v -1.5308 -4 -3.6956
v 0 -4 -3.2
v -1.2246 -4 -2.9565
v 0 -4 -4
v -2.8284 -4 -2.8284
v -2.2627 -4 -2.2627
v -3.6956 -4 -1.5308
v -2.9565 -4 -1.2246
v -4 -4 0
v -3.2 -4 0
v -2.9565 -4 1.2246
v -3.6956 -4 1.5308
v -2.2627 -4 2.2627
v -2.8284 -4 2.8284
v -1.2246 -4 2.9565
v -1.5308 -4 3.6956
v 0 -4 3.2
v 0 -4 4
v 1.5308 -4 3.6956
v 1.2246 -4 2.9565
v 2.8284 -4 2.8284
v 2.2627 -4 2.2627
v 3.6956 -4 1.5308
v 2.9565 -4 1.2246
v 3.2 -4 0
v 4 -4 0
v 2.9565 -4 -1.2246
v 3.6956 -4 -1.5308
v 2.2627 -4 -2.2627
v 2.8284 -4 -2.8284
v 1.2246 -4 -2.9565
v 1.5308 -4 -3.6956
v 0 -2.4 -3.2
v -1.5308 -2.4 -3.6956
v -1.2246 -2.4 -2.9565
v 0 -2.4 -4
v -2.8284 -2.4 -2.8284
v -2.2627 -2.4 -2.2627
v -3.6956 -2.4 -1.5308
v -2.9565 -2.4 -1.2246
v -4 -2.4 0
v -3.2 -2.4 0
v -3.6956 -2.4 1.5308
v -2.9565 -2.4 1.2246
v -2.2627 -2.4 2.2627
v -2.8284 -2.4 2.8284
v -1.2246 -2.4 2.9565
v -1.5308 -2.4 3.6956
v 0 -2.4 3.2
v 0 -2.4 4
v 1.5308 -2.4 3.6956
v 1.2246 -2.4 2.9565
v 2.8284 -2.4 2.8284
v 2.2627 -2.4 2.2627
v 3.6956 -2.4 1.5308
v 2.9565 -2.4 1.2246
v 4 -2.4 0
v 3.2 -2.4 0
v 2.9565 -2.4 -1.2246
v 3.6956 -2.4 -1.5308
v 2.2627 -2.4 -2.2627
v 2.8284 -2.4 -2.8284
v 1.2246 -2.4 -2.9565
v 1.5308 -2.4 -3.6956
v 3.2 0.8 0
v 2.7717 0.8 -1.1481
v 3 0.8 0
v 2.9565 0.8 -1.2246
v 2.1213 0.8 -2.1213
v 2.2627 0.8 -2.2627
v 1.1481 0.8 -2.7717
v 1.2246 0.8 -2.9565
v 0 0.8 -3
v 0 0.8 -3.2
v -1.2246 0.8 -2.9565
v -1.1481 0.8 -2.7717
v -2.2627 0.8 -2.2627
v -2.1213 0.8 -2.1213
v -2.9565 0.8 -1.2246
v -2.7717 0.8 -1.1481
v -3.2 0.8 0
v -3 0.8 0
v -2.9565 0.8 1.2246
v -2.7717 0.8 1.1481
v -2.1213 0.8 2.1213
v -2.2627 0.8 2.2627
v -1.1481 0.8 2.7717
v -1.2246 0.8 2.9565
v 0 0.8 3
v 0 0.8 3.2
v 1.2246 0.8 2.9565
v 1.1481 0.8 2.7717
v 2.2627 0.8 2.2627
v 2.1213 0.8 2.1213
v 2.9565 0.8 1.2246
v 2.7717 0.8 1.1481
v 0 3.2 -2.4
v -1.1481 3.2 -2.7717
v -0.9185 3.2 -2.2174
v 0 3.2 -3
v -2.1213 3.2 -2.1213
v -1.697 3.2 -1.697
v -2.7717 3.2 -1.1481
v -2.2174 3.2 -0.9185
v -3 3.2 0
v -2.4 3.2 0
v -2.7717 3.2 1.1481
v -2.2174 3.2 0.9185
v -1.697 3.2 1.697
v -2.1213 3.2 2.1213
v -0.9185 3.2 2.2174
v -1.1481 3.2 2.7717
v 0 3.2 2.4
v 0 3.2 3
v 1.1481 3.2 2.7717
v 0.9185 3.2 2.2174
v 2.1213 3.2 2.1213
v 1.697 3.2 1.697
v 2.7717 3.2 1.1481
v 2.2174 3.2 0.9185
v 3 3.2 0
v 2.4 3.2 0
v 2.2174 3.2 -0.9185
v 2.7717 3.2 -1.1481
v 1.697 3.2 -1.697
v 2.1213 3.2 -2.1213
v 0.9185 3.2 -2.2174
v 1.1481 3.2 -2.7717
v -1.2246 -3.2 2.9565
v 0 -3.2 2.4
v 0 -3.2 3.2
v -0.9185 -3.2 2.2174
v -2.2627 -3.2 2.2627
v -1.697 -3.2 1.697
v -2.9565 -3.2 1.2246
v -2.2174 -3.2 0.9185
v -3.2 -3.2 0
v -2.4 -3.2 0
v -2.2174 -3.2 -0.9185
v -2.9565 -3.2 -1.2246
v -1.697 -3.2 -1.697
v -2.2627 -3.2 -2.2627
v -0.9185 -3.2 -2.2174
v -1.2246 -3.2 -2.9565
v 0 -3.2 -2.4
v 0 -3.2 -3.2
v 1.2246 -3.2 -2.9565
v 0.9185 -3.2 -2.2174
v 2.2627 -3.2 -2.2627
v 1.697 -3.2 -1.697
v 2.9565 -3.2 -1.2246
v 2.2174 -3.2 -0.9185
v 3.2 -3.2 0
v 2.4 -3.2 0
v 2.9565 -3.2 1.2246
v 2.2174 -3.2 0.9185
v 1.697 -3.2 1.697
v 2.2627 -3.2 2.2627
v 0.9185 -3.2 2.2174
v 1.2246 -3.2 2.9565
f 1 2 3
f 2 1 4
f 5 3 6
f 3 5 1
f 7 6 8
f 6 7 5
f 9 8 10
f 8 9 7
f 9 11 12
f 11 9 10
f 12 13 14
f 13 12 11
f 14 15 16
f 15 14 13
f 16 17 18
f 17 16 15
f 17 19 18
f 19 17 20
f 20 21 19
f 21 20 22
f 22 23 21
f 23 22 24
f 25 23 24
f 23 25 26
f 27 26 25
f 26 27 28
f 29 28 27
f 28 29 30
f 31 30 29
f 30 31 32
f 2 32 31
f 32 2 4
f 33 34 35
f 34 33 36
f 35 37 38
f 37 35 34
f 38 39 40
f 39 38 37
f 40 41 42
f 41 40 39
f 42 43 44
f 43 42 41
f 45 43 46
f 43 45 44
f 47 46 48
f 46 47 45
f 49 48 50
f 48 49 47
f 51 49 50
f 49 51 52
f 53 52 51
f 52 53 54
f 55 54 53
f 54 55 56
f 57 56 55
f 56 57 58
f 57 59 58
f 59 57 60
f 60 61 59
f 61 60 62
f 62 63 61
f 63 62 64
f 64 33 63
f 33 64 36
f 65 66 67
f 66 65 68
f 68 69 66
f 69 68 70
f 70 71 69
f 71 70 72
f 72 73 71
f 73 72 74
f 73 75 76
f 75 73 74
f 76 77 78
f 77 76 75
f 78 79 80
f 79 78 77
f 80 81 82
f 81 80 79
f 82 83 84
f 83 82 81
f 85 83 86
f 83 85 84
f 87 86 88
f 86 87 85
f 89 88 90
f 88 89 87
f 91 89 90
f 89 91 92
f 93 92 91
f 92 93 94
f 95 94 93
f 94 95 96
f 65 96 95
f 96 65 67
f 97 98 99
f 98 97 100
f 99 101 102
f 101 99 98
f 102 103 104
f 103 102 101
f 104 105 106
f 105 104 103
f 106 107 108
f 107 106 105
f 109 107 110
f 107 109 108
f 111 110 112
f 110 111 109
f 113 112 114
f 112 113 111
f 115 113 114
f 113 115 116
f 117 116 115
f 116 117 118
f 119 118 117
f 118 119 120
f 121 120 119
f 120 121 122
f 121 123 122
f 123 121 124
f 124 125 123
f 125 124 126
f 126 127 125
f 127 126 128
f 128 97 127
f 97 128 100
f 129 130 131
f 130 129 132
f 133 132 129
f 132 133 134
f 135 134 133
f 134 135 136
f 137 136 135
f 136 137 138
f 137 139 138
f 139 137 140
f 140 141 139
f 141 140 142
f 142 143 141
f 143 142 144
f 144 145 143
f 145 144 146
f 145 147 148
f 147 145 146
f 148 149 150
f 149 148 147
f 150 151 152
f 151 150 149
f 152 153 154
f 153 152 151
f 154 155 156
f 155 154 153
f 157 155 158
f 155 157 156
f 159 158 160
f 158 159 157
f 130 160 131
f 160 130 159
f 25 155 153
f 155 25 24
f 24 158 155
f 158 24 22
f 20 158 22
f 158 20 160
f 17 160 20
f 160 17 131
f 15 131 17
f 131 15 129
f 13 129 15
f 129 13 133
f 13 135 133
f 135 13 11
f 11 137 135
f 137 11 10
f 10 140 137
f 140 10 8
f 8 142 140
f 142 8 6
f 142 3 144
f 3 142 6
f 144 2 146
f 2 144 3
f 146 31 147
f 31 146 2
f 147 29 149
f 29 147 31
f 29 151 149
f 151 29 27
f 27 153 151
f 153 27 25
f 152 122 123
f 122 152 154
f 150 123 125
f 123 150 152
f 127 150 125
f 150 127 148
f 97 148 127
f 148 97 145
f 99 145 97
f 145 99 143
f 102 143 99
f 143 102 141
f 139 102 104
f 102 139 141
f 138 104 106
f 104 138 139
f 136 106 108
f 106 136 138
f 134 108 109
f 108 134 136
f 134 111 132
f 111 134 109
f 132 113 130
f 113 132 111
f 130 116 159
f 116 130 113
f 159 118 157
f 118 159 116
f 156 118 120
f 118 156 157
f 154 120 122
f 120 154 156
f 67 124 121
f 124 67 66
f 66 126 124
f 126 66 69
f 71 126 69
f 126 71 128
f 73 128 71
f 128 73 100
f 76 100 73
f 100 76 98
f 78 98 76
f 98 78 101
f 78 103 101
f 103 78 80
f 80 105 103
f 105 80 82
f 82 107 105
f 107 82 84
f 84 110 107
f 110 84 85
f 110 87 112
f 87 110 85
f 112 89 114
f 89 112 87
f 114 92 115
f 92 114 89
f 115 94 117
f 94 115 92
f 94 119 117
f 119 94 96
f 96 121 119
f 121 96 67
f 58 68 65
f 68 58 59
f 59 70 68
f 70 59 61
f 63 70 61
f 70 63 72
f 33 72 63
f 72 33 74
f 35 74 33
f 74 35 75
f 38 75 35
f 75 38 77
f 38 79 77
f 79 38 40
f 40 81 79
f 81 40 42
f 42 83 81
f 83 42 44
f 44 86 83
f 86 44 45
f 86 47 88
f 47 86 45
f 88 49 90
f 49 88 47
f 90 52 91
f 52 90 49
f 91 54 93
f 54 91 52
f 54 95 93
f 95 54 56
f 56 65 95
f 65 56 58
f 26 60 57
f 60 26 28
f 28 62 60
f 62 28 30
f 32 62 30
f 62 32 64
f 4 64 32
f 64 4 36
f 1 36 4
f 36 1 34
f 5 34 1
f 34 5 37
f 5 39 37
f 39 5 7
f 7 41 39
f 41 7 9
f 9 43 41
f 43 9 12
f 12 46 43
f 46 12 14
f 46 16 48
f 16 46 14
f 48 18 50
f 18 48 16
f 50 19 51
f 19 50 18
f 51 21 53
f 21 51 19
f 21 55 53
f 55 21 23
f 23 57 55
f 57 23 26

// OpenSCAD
// file: ../p/4-4ring3.scad
use <../lib.scad>
function ldraw_lib__4_4ring3() = [
// 0 Ring  3 x 1.0
// 0 Name: 4-4ring3.dat
// 0 Author: James Jessiman
// 0 !LDRAW_ORG Primitive UPDATE 2009-01
// 0 !LICENSE Licensed under CC BY 4.0 : see CAreadme.txt
// 
// 0 BFC CERTIFY CCW
  [0,"BFC","CERTIFY"],
  [0,"BFC","CCW"],
// 
// 0 !HISTORY 1998-12-15 [PTadmin] Official Update 1998-10
// 0 !HISTORY 2002-04-05 [hafhead] Added BFC statement
// 0 !HISTORY 2002-04-25 [PTadmin] Official Update 2002-02
// 0 !HISTORY 2007-06-24 [PTadmin] Header formatted for Contributor Agreement
// 0 !HISTORY 2008-07-01 [PTadmin] Official Update 2008-01
// 0 !HISTORY 2008-08-26 [cwdee] Switch polygon winding and rename
// 0 !HISTORY 2009-05-02 [PTadmin] Official Update 2009-01
// 
// 
// 4 16 -1.5308 0 3.6956 -1.1481 0 2.7717 0 0 3 0 0 4
  [4,16,-1.5308,0,3.6956,-1.1481,0,2.7717,0,0,3,0,0,4],
// 4 16 -2.8284 0 2.8284 -2.1213 0 2.1213 -1.1481 0 2.7717 -1.5308 0 3.6956
  [4,16,-2.8284,0,2.8284,-2.1213,0,2.1213,-1.1481,0,2.7717,-1.5308,0,3.6956],
// 4 16 -3.6956 0 1.5308 -2.7717 0 1.1481 -2.1213 0 2.1213 -2.8284 0 2.8284
  [4,16,-3.6956,0,1.5308,-2.7717,0,1.1481,-2.1213,0,2.1213,-2.8284,0,2.8284],
// 4 16 -4 0 0 -3 0 0 -2.7717 0 1.1481 -3.6956 0 1.5308
  [4,16,-4,0,0,-3,0,0,-2.7717,0,1.1481,-3.6956,0,1.5308],
// 4 16 -3.6956 0 -1.5308 -2.7717 0 -1.1481 -3 0 0 -4 0 0
  [4,16,-3.6956,0,-1.5308,-2.7717,0,-1.1481,-3,0,0,-4,0,0],
// 4 16 -2.8284 0 -2.8284 -2.1213 0 -2.1213 -2.7717 0 -1.1481 -3.6956 0 -1.5308
  [4,16,-2.8284,0,-2.8284,-2.1213,0,-2.1213,-2.7717,0,-1.1481,-3.6956,0,-1.5308],
// 4 16 -1.5308 0 -3.6956 -1.1481 0 -2.7717 -2.1213 0 -2.1213 -2.8284 0 -2.8284
  [4,16,-1.5308,0,-3.6956,-1.1481,0,-2.7717,-2.1213,0,-2.1213,-2.8284,0,-2.8284],
// 4 16 0 0 -4 0 0 -3 -1.1481 0 -2.7717 -1.5308 0 -3.6956
  [4,16,0,0,-4,0,0,-3,-1.1481,0,-2.7717,-1.5308,0,-3.6956],
// 4 16 1.5308 0 -3.6956 1.1481 0 -2.7717 0 0 -3 0 0 -4
  [4,16,1.5308,0,-3.6956,1.1481,0,-2.7717,0,0,-3,0,0,-4],
// 4 16 2.8284 0 -2.8284 2.1213 0 -2.1213 1.1481 0 -2.7717 1.5308 0 -3.6956
  [4,16,2.8284,0,-2.8284,2.1213,0,-2.1213,1.1481,0,-2.7717,1.5308,0,-3.6956],
// 4 16 3.6956 0 -1.5308 2.7717 0 -1.1481 2.1213 0 -2.1213 2.8284 0 -2.8284
  [4,16,3.6956,0,-1.5308,2.7717,0,-1.1481,2.1213,0,-2.1213,2.8284,0,-2.8284],
// 4 16 4 0 0 3 0 0 2.7717 0 -1.1481 3.6956 0 -1.5308
  [4,16,4,0,0,3,0,0,2.7717,0,-1.1481,3.6956,0,-1.5308],
// 4 16 3.6956 0 1.5308 2.7717 0 1.1481 3 0 0 4 0 0
  [4,16,3.6956,0,1.5308,2.7717,0,1.1481,3,0,0,4,0,0],
// 4 16 2.8284 0 2.8284 2.1213 0 2.1213 2.7717 0 1.1481 3.6956 0 1.5308
  [4,16,2.8284,0,2.8284,2.1213,0,2.1213,2.7717,0,1.1481,3.6956,0,1.5308],
// 4 16 1.5308 0 3.6956 1.1481 0 2.7717 2.1213 0 2.1213 2.8284 0 2.8284
  [4,16,1.5308,0,3.6956,1.1481,0,2.7717,2.1213,0,2.1213,2.8284,0,2.8284],
// 4 16 0 0 4 0 0 3 1.1481 0 2.7717 1.5308 0 3.6956
  [4,16,0,0,4,0,0,3,1.1481,0,2.7717,1.5308,0,3.6956],
// 0
];
module ldraw_lib__4_4ring3(step=0, col=false, unit=2/5, alt=false, line=0.2, solid=!$preview)
    makepoly(ldraw_lib__4_4ring3(), step=step, col=col, unit=unit, alt=alt, line=line, solid=solid);
ldraw_lib__4_4ring3(line=0.2);
// file: ../p/peghole.scad
use <../lib.scad>
use <4-4cyli.scad>
use <4-4edge.scad>
use <4-4ring3.scad>
function ldraw_lib__peghole() = [
// 0 Peg Hole End
// 0 Name: peghole.dat
// 0 Author: James Jessiman
// 0 !LDRAW_ORG Primitive UPDATE 2010-01
// 0 !LICENSE Licensed under CC BY 4.0 : see CAreadme.txt
// 
// 0 BFC CERTIFY CCW
  [0,"BFC","CERTIFY"],
  [0,"BFC","CCW"],
// 
// 0 !HISTORY 2002-05-01 [mkennedy] replace code with ring3
// 0 !HISTORY 2002-05-01 [sbliss] BFC
// 0 !HISTORY 2002-06-11 [PTadmin] Official Update 2002-03
// 0 !HISTORY 2007-06-24 [PTadmin] Header formatted for Contributor Agreement
// 0 !HISTORY 2008-07-01 [PTadmin] Official Update 2008-01
// 0 !HISTORY 2010-01-14 [cwdee] Update ring3 to 4-4ring3
// 0 !HISTORY 2010-04-05 [PTadmin] Official Update 2010-01
// 
// 
// 1 16 0 0 0 8 0 0 0 1 0 0 0 8 4-4edge.dat
  [1,16,0,0,0,8,0,0,0,1,0,0,0,8, ldraw_lib__4_4edge()],
// 1 16 0 2 0 8 0 0 0 1 0 0 0 8 4-4edge.dat
  [1,16,0,2,0,8,0,0,0,1,0,0,0,8, ldraw_lib__4_4edge()],
// 1 16 0 2 0 6 0 0 0 1 0 0 0 6 4-4edge.dat
  [1,16,0,2,0,6,0,0,0,1,0,0,0,6, ldraw_lib__4_4edge()],
// 1 16 0 2 0 2 0 0 0 1 0 0 0 2 4-4ring3.dat
  [1,16,0,2,0,2,0,0,0,1,0,0,0,2, ldraw_lib__4_4ring3()],
// 0 BFC INVERTNEXT
  [0,"BFC","INVERTNEXT"],
// 1 16 0 0 0 8 0 0 0 2 0 0 0 8 4-4cyli.dat
  [1,16,0,0,0,8,0,0,0,2,0,0,0,8, ldraw_lib__4_4cyli()],
// 0
];
module ldraw_lib__peghole(step=0, col=false, unit=2/5, alt=false, line=0.2, solid=!$preview)
    makepoly(ldraw_lib__peghole(), step=step, col=col, unit=unit, alt=alt, line=line, solid=solid);
ldraw_lib__peghole(line=0.2);
// file: ../p/4-4ring4.scad
use <../lib.scad>
function ldraw_lib__4_4ring4() = [
// 0 Ring  4 x 1.0
// 0 Name: 4-4ring4.dat
// 0 Author: James Jessiman
// 0 !LDRAW_ORG Primitive UPDATE 2009-01
// 0 !LICENSE Licensed under CC BY 4.0 : see CAreadme.txt
// 
// 0 BFC CERTIFY CCW
  [0,"BFC","CERTIFY"],
  [0,"BFC","CCW"],
// 
// 0 !HISTORY 1998-12-15 [PTadmin] Official Update 1998-10
// 0 !HISTORY 2002-04-08 [BrickCaster] Modified for BFC compliance
// 0 !HISTORY 2002-04-25 [PTadmin] Official Update 2002-02
// 0 !HISTORY 2007-06-24 [PTadmin] Header formatted for Contributor Agreement
// 0 !HISTORY 2008-07-01 [PTadmin] Official Update 2008-01
// 0 !HISTORY 2008-08-26 [cwdee] Switch polygon winding and rename
// 0 !HISTORY 2009-05-02 [PTadmin] Official Update 2009-01
// 
// 
// 4 16 -1.9135 0 4.6195 -1.5308 0 3.6956 0 0 4 0 0 5
  [4,16,-1.9135,0,4.6195,-1.5308,0,3.6956,0,0,4,0,0,5],
// 4 16 -3.5355 0 3.5355 -2.8284 0 2.8284 -1.5308 0 3.6956 -1.9135 0 4.6195
  [4,16,-3.5355,0,3.5355,-2.8284,0,2.8284,-1.5308,0,3.6956,-1.9135,0,4.6195],
// 4 16 -4.6195 0 1.9135 -3.6956 0 1.5308 -2.8284 0 2.8284 -3.5355 0 3.5355
  [4,16,-4.6195,0,1.9135,-3.6956,0,1.5308,-2.8284,0,2.8284,-3.5355,0,3.5355],
// 4 16 -5 0 0 -4 0 0 -3.6956 0 1.5308 -4.6195 0 1.9135
  [4,16,-5,0,0,-4,0,0,-3.6956,0,1.5308,-4.6195,0,1.9135],
// 4 16 -4.6195 0 -1.9135 -3.6956 0 -1.5308 -4 0 0 -5 0 0
  [4,16,-4.6195,0,-1.9135,-3.6956,0,-1.5308,-4,0,0,-5,0,0],
// 4 16 -3.5355 0 -3.5355 -2.8284 0 -2.8284 -3.6956 0 -1.5308 -4.6195 0 -1.9135
  [4,16,-3.5355,0,-3.5355,-2.8284,0,-2.8284,-3.6956,0,-1.5308,-4.6195,0,-1.9135],
// 4 16 -1.9135 0 -4.6195 -1.5308 0 -3.6956 -2.8284 0 -2.8284 -3.5355 0 -3.5355
  [4,16,-1.9135,0,-4.6195,-1.5308,0,-3.6956,-2.8284,0,-2.8284,-3.5355,0,-3.5355],
// 4 16 0 0 -5 0 0 -4 -1.5308 0 -3.6956 -1.9135 0 -4.6195
  [4,16,0,0,-5,0,0,-4,-1.5308,0,-3.6956,-1.9135,0,-4.6195],
// 4 16 1.9135 0 -4.6195 1.5308 0 -3.6956 0 0 -4 0 0 -5
  [4,16,1.9135,0,-4.6195,1.5308,0,-3.6956,0,0,-4,0,0,-5],
// 4 16 3.5355 0 -3.5355 2.8284 0 -2.8284 1.5308 0 -3.6956 1.9135 0 -4.6195
  [4,16,3.5355,0,-3.5355,2.8284,0,-2.8284,1.5308,0,-3.6956,1.9135,0,-4.6195],
// 4 16 4.6195 0 -1.9135 3.6956 0 -1.5308 2.8284 0 -2.8284 3.5355 0 -3.5355
  [4,16,4.6195,0,-1.9135,3.6956,0,-1.5308,2.8284,0,-2.8284,3.5355,0,-3.5355],
// 4 16 5 0 0 4 0 0 3.6956 0 -1.5308 4.6195 0 -1.9135
  [4,16,5,0,0,4,0,0,3.6956,0,-1.5308,4.6195,0,-1.9135],
// 4 16 4.6195 0 1.9135 3.6956 0 1.5308 4 0 0 5 0 0
  [4,16,4.6195,0,1.9135,3.6956,0,1.5308,4,0,0,5,0,0],
// 4 16 3.5355 0 3.5355 2.8284 0 2.8284 3.6956 0 1.5308 4.6195 0 1.9135
  [4,16,3.5355,0,3.5355,2.8284,0,2.8284,3.6956,0,1.5308,4.6195,0,1.9135],
// 4 16 1.9135 0 4.6195 1.5308 0 3.6956 2.8284 0 2.8284 3.5355 0 3.5355
  [4,16,1.9135,0,4.6195,1.5308,0,3.6956,2.8284,0,2.8284,3.5355,0,3.5355],
// 4 16 0 0 5 0 0 4 1.5308 0 3.6956 1.9135 0 4.6195
  [4,16,0,0,5,0,0,4,1.5308,0,3.6956,1.9135,0,4.6195],
// 0
];
module ldraw_lib__4_4ring4(step=0, col=false, unit=2/5, alt=false, line=0.2, solid=!$preview)
    makepoly(ldraw_lib__4_4ring4(), step=step, col=col, unit=unit, alt=alt, line=line, solid=solid);
ldraw_lib__4_4ring4(line=0.2);
// file: ../p/4-4ring15.scad
use <../lib.scad>
function ldraw_lib__4_4ring15() = [
// 0 Ring 15 x 1.0
// 0 Name: 4-4ring15.dat
// 0 Author: Mark Kennedy [mkennedy]
// 0 !LDRAW_ORG Primitive UPDATE 2024-02
// 0 !LICENSE Licensed under CC BY 4.0 : see CAreadme.txt
// 
// 0 BFC CERTIFY CCW
  [0,"BFC","CERTIFY"],
  [0,"BFC","CCW"],
// 
// 0 !HISTORY 2004-04-22 [PTadmin] Official Update 2004-02
// 0 !HISTORY 2007-06-24 [PTadmin] Header formatted for Contributor Agreement
// 0 !HISTORY 2008-07-01 [PTadmin] Official Update 2008-01
// 0 !HISTORY 2012-02-16 [Philo] Changed to CCW
// 0 !HISTORY 2012-03-30 [PTadmin] Official Update 2012-01
// 0 !HISTORY 2024-03-23 [OrionP] Moved from 4-4rin15.dat
// 0 !HISTORY 2024-03-24 [OrionP] Official Update 2024-02
// 
// 4 16 16 0 0 14.7824 0 6.1232 13.8585 0 5.7405 15 0 0
  [4,16,16,0,0,14.7824,0,6.1232,13.8585,0,5.7405,15,0,0],
// 4 16 14.7824 0 6.1232 11.3136 0 11.3136 10.6065 0 10.6065 13.8585 0 5.7405
  [4,16,14.7824,0,6.1232,11.3136,0,11.3136,10.6065,0,10.6065,13.8585,0,5.7405],
// 4 16 11.3136 0 11.3136 6.1232 0 14.7824 5.7405 0 13.8585 10.6065 0 10.6065
  [4,16,11.3136,0,11.3136,6.1232,0,14.7824,5.7405,0,13.8585,10.6065,0,10.6065],
// 4 16 6.1232 0 14.7824 0 0 16 0 0 15 5.7405 0 13.8585
  [4,16,6.1232,0,14.7824,0,0,16,0,0,15,5.7405,0,13.8585],
// 4 16 0 0 16 -6.1232 0 14.7824 -5.7405 0 13.8585 0 0 15
  [4,16,0,0,16,-6.1232,0,14.7824,-5.7405,0,13.8585,0,0,15],
// 4 16 -6.1232 0 14.7824 -11.3136 0 11.3136 -10.6065 0 10.6065 -5.7405 0 13.8585
  [4,16,-6.1232,0,14.7824,-11.3136,0,11.3136,-10.6065,0,10.6065,-5.7405,0,13.8585],
// 4 16 -11.3136 0 11.3136 -14.7824 0 6.1232 -13.8585 0 5.7405 -10.6065 0 10.6065
  [4,16,-11.3136,0,11.3136,-14.7824,0,6.1232,-13.8585,0,5.7405,-10.6065,0,10.6065],
// 4 16 -14.7824 0 6.1232 -16 0 0 -15 0 0 -13.8585 0 5.7405
  [4,16,-14.7824,0,6.1232,-16,0,0,-15,0,0,-13.8585,0,5.7405],
// 4 16 -16 0 0 -14.7824 0 -6.1232 -13.8585 0 -5.7405 -15 0 0
  [4,16,-16,0,0,-14.7824,0,-6.1232,-13.8585,0,-5.7405,-15,0,0],
// 4 16 -14.7824 0 -6.1232 -11.3136 0 -11.3136 -10.6065 0 -10.6065 -13.8585 0 -5.7405
  [4,16,-14.7824,0,-6.1232,-11.3136,0,-11.3136,-10.6065,0,-10.6065,-13.8585,0,-5.7405],
// 4 16 -11.3136 0 -11.3136 -6.1232 0 -14.7824 -5.7405 0 -13.8585 -10.6065 0 -10.6065
  [4,16,-11.3136,0,-11.3136,-6.1232,0,-14.7824,-5.7405,0,-13.8585,-10.6065,0,-10.6065],
// 4 16 -6.1232 0 -14.7824 0 0 -16 0 0 -15 -5.7405 0 -13.8585
  [4,16,-6.1232,0,-14.7824,0,0,-16,0,0,-15,-5.7405,0,-13.8585],
// 4 16 0 0 -16 6.1232 0 -14.7824 5.7405 0 -13.8585 0 0 -15
  [4,16,0,0,-16,6.1232,0,-14.7824,5.7405,0,-13.8585,0,0,-15],
// 4 16 6.1232 0 -14.7824 11.3136 0 -11.3136 10.6065 0 -10.6065 5.7405 0 -13.8585
  [4,16,6.1232,0,-14.7824,11.3136,0,-11.3136,10.6065,0,-10.6065,5.7405,0,-13.8585],
// 4 16 11.3136 0 -11.3136 14.7824 0 -6.1232 13.8585 0 -5.7405 10.6065 0 -10.6065
  [4,16,11.3136,0,-11.3136,14.7824,0,-6.1232,13.8585,0,-5.7405,10.6065,0,-10.6065],
// 4 16 14.7824 0 -6.1232 16 0 0 15 0 0 13.8585 0 -5.7405
  [4,16,14.7824,0,-6.1232,16,0,0,15,0,0,13.8585,0,-5.7405],
];
module ldraw_lib__4_4ring15(step=0, col=false, unit=2/5, alt=false, line=0.2, solid=!$preview)
    makepoly(ldraw_lib__4_4ring15(), step=step, col=col, unit=unit, alt=alt, line=line, solid=solid);
ldraw_lib__4_4ring15(line=0.2);
// file: ../p/4-4edge.scad
use <../lib.scad>
function ldraw_lib__4_4edge() = [
// 0 Circle 1.0
// 0 Name: 4-4edge.dat
// 0 Author: James Jessiman
// 0 !LDRAW_ORG Primitive UPDATE 2017-01
// 0 !LICENSE Licensed under CC BY 4.0 : see CAreadme.txt
// 
// 0 BFC CERTIFY CCW
  [0,"BFC","CERTIFY"],
  [0,"BFC","CCW"],
// 
// 0 !HISTORY 1998-12-15 [PTadmin] Official Update 1998-10
// 0 !HISTORY 2005-12-28 [PTadmin] Official Update 2005-01
// 0 !HISTORY 2007-06-24 [PTadmin] Header formatted for Contributor Agreement
// 0 !HISTORY 2008-07-01 [PTadmin] Official Update 2008-01
// 0 !HISTORY 2017-01-15 [Steffen] BFCed
// 0 !HISTORY 2017-12-30 [PTadmin] Official Update 2017-01
// 
// 
// 2 24 1 0 0 0.9239 0 0.3827
  [2,24,1,0,0,0.9239,0,0.3827],
// 2 24 0.9239 0 0.3827 0.7071 0 0.7071
  [2,24,0.9239,0,0.3827,0.7071,0,0.7071],
// 2 24 0.7071 0 0.7071 0.3827 0 0.9239
  [2,24,0.7071,0,0.7071,0.3827,0,0.9239],
// 2 24 0.3827 0 0.9239 0 0 1
  [2,24,0.3827,0,0.9239,0,0,1],
// 2 24 0 0 1 -0.3827 0 0.9239
  [2,24,0,0,1,-0.3827,0,0.9239],
// 2 24 -0.3827 0 0.9239 -0.7071 0 0.7071
  [2,24,-0.3827,0,0.9239,-0.7071,0,0.7071],
// 2 24 -0.7071 0 0.7071 -0.9239 0 0.3827
  [2,24,-0.7071,0,0.7071,-0.9239,0,0.3827],
// 2 24 -0.9239 0 0.3827 -1 0 -0
  [2,24,-0.9239,0,0.3827,-1,0,-0],
// 2 24 -1 0 -0 -0.9239 0 -0.3827
  [2,24,-1,0,-0,-0.9239,0,-0.3827],
// 2 24 -0.9239 0 -0.3827 -0.7071 0 -0.7071
  [2,24,-0.9239,0,-0.3827,-0.7071,0,-0.7071],
// 2 24 -0.7071 0 -0.7071 -0.3827 0 -0.9239
  [2,24,-0.7071,0,-0.7071,-0.3827,0,-0.9239],
// 2 24 -0.3827 0 -0.9239 0 0 -1
  [2,24,-0.3827,0,-0.9239,0,0,-1],
// 2 24 0 0 -1 0.3827 0 -0.9239
  [2,24,0,0,-1,0.3827,0,-0.9239],
// 2 24 0.3827 0 -0.9239 0.7071 0 -0.7071
  [2,24,0.3827,0,-0.9239,0.7071,0,-0.7071],
// 2 24 0.7071 0 -0.7071 0.9239 0 -0.3827
  [2,24,0.7071,0,-0.7071,0.9239,0,-0.3827],
// 2 24 0.9239 0 -0.3827 1 0 0
  [2,24,0.9239,0,-0.3827,1,0,0],
];
module ldraw_lib__4_4edge(step=0, col=false, unit=2/5, alt=false, line=0.2, solid=!$preview)
    makepoly(ldraw_lib__4_4edge(), step=step, col=col, unit=unit, alt=alt, line=line, solid=solid);
ldraw_lib__4_4edge(line=0.2);
// file: ../p/4-4cyli.scad
use <../lib.scad>
function ldraw_lib__4_4cyli() = [
// 0 Cylinder 1.0
// 0 Name: 4-4cyli.dat
// 0 Author: James Jessiman
// 0 !LDRAW_ORG Primitive UPDATE 2005-01
// 0 !LICENSE Licensed under CC BY 4.0 : see CAreadme.txt
// 
// 0 BFC CERTIFY CCW
  [0,"BFC","CERTIFY"],
  [0,"BFC","CCW"],
// 
// 0 !HISTORY 1998-12-15 [PTadmin] Official Update 1998-10
// 0 !HISTORY 2002-03-23 [sbliss] Added BFC statement; merged headers from files in distributions LDraw 0.27 and Complete.
// 0 !HISTORY 2002-04-25 [PTadmin] Official Update 2002-02
// 0 !HISTORY 2004-12-14 [guyvivan] BFC CCW
// 0 !HISTORY 2005-12-28 [PTadmin] Official Update 2005-01
// 0 !HISTORY 2007-06-24 [PTadmin] Header formatted for Contributor Agreement
// 0 !HISTORY 2008-07-01 [PTadmin] Official Update 2008-01
// 
// 
// 4 16 1 1 0 0.9239 1 0.3827 0.9239 0 0.3827 1 0 0
  [4,16,1,1,0,0.9239,1,0.3827,0.9239,0,0.3827,1,0,0],
// 5 24 1 0 0 1 1 0 0.9239 0 0.3827 0.9239 0 -0.3827
  [5,24,1,0,0,1,1,0,0.9239,0,0.3827,0.9239,0,-0.3827],
// 4 16 0.9239 1 0.3827 0.7071 1 0.7071 0.7071 0 0.7071 0.9239 0 0.3827
  [4,16,0.9239,1,0.3827,0.7071,1,0.7071,0.7071,0,0.7071,0.9239,0,0.3827],
// 5 24 0.9239 0 0.3827 0.9239 1 0.3827 0.7071 0 0.7071 1 0 0
  [5,24,0.9239,0,0.3827,0.9239,1,0.3827,0.7071,0,0.7071,1,0,0],
// 4 16 0.7071 1 0.7071 0.3827 1 0.9239 0.3827 0 0.9239 0.7071 0 0.7071
  [4,16,0.7071,1,0.7071,0.3827,1,0.9239,0.3827,0,0.9239,0.7071,0,0.7071],
// 5 24 0.7071 0 0.7071 0.7071 1 0.7071 0.3827 0 0.9239 0.9239 0 0.3827
  [5,24,0.7071,0,0.7071,0.7071,1,0.7071,0.3827,0,0.9239,0.9239,0,0.3827],
// 4 16 0.3827 1 0.9239 0 1 1 0 0 1 0.3827 0 0.9239
  [4,16,0.3827,1,0.9239,0,1,1,0,0,1,0.3827,0,0.9239],
// 5 24 0.3827 0 0.9239 0.3827 1 0.9239 0 0 1 0.7071 0 0.7071
  [5,24,0.3827,0,0.9239,0.3827,1,0.9239,0,0,1,0.7071,0,0.7071],
// 4 16 0 1 1 -0.3827 1 0.9239 -0.3827 0 0.9239 0 0 1
  [4,16,0,1,1,-0.3827,1,0.9239,-0.3827,0,0.9239,0,0,1],
// 5 24 0 0 1 0 1 1 -0.3827 0 0.9239 0.3827 0 0.9239
  [5,24,0,0,1,0,1,1,-0.3827,0,0.9239,0.3827,0,0.9239],
// 4 16 -0.3827 1 0.9239 -0.7071 1 0.7071 -0.7071 0 0.7071 -0.3827 0 0.9239
  [4,16,-0.3827,1,0.9239,-0.7071,1,0.7071,-0.7071,0,0.7071,-0.3827,0,0.9239],
// 5 24 -0.3827 0 0.9239 -0.3827 1 0.9239 -0.7071 0 0.7071 0 0 1
  [5,24,-0.3827,0,0.9239,-0.3827,1,0.9239,-0.7071,0,0.7071,0,0,1],
// 4 16 -0.7071 1 0.7071 -0.9239 1 0.3827 -0.9239 0 0.3827 -0.7071 0 0.7071
  [4,16,-0.7071,1,0.7071,-0.9239,1,0.3827,-0.9239,0,0.3827,-0.7071,0,0.7071],
// 5 24 -0.7071 0 0.7071 -0.7071 1 0.7071 -0.9239 0 0.3827 -0.3827 0 0.9239
  [5,24,-0.7071,0,0.7071,-0.7071,1,0.7071,-0.9239,0,0.3827,-0.3827,0,0.9239],
// 4 16 -0.9239 1 0.3827 -1 1 0 -1 0 0 -0.9239 0 0.3827
  [4,16,-0.9239,1,0.3827,-1,1,0,-1,0,0,-0.9239,0,0.3827],
// 5 24 -0.9239 0 0.3827 -0.9239 1 0.3827 -1 0 0 -0.7071 0 0.7071
  [5,24,-0.9239,0,0.3827,-0.9239,1,0.3827,-1,0,0,-0.7071,0,0.7071],
// 4 16 -1 1 0 -0.9239 1 -0.3827 -0.9239 0 -0.3827 -1 0 0
  [4,16,-1,1,0,-0.9239,1,-0.3827,-0.9239,0,-0.3827,-1,0,0],
// 5 24 -1 0 0 -1 1 0 -0.9239 0 -0.3827 -0.9239 0 0.3827
  [5,24,-1,0,0,-1,1,0,-0.9239,0,-0.3827,-0.9239,0,0.3827],
// 4 16 -0.9239 1 -0.3827 -0.7071 1 -0.7071 -0.7071 0 -0.7071 -0.9239 0 -0.3827
  [4,16,-0.9239,1,-0.3827,-0.7071,1,-0.7071,-0.7071,0,-0.7071,-0.9239,0,-0.3827],
// 5 24 -0.9239 0 -0.3827 -0.9239 1 -0.3827 -0.7071 0 -0.7071 -1 0 0
  [5,24,-0.9239,0,-0.3827,-0.9239,1,-0.3827,-0.7071,0,-0.7071,-1,0,0],
// 4 16 -0.7071 1 -0.7071 -0.3827 1 -0.9239 -0.3827 0 -0.9239 -0.7071 0 -0.7071
  [4,16,-0.7071,1,-0.7071,-0.3827,1,-0.9239,-0.3827,0,-0.9239,-0.7071,0,-0.7071],
// 5 24 -0.7071 0 -0.7071 -0.7071 1 -0.7071 -0.3827 0 -0.9239 -0.9239 0 -0.3827
  [5,24,-0.7071,0,-0.7071,-0.7071,1,-0.7071,-0.3827,0,-0.9239,-0.9239,0,-0.3827],
// 4 16 -0.3827 1 -0.9239 0 1 -1 0 0 -1 -0.3827 0 -0.9239
  [4,16,-0.3827,1,-0.9239,0,1,-1,0,0,-1,-0.3827,0,-0.9239],
// 5 24 -0.3827 0 -0.9239 -0.3827 1 -0.9239 0 0 -1 -0.7071 0 -0.7071
  [5,24,-0.3827,0,-0.9239,-0.3827,1,-0.9239,0,0,-1,-0.7071,0,-0.7071],
// 4 16 0 1 -1 0.3827 1 -0.9239 0.3827 0 -0.9239 0 0 -1
  [4,16,0,1,-1,0.3827,1,-0.9239,0.3827,0,-0.9239,0,0,-1],
// 5 24 0 0 -1 0 1 -1 0.3827 0 -0.9239 -0.3827 0 -0.9239
  [5,24,0,0,-1,0,1,-1,0.3827,0,-0.9239,-0.3827,0,-0.9239],
// 4 16 0.3827 1 -0.9239 0.7071 1 -0.7071 0.7071 0 -0.7071 0.3827 0 -0.9239
  [4,16,0.3827,1,-0.9239,0.7071,1,-0.7071,0.7071,0,-0.7071,0.3827,0,-0.9239],
// 5 24 0.3827 0 -0.9239 0.3827 1 -0.9239 0.7071 0 -0.7071 0 0 -1
  [5,24,0.3827,0,-0.9239,0.3827,1,-0.9239,0.7071,0,-0.7071,0,0,-1],
// 4 16 0.7071 1 -0.7071 0.9239 1 -0.3827 0.9239 0 -0.3827 0.7071 0 -0.7071
  [4,16,0.7071,1,-0.7071,0.9239,1,-0.3827,0.9239,0,-0.3827,0.7071,0,-0.7071],
// 5 24 0.7071 0 -0.7071 0.7071 1 -0.7071 0.9239 0 -0.3827 0.3827 0 -0.9239
  [5,24,0.7071,0,-0.7071,0.7071,1,-0.7071,0.9239,0,-0.3827,0.3827,0,-0.9239],
// 4 16 0.9239 1 -0.3827 1 1 0 1 0 0 0.9239 0 -0.3827
  [4,16,0.9239,1,-0.3827,1,1,0,1,0,0,0.9239,0,-0.3827],
// 5 24 0.9239 0 -0.3827 0.9239 1 -0.3827 1 0 0 0.7071 0 -0.7071
  [5,24,0.9239,0,-0.3827,0.9239,1,-0.3827,1,0,0,0.7071,0,-0.7071],
// 0
];
module ldraw_lib__4_4cyli(step=0, col=false, unit=2/5, alt=false, line=0.2, solid=!$preview)
    makepoly(ldraw_lib__4_4cyli(), step=step, col=col, unit=unit, alt=alt, line=line, solid=solid);
ldraw_lib__4_4cyli(line=0.2);
// main file
use <../lib.scad>
use <../p/4-4cyli.scad>
use <../p/4-4edge.scad>
use <../p/4-4ring15.scad>
use <../p/4-4ring4.scad>
use <../p/peghole.scad>
function ldraw_lib__6221() = [
// 0 Technic Handle
// 0 Name: 6221.dat
// 0 Author: James Jessiman
// 0 !LDRAW_ORG Part UPDATE 2024-02
// 0 !LICENSE Licensed under CC BY 4.0 : see CAreadme.txt
// 
// 0 BFC CERTIFY CW
  [0,"BFC","CERTIFY"],
  [0,"BFC","CW"],
// 
// 0 !HISTORY 2007-08-31 [Philo] BFC'ed, used ring primitives; Checked against The LEGO Universe Team version
// 0 !HISTORY 2010-07-05 [PTadmin] Official Update 2010-02
// 0 !HISTORY 2024-03-23 [OrionP] Updated ring primitives
// 0 !HISTORY 2024-03-24 [OrionP] Official Update 2024-02
// 
// 1 16 0 0 8 6 0 0 0 0 6 0 1 0 4-4edge.dat
  [1,16,0,0,8,6,0,0,0,0,6,0,1,0, ldraw_lib__4_4edge()],
// 1 16 0 0 8 7.5 0 0 0 0 7.5 0 1 0 4-4edge.dat
  [1,16,0,0,8,7.5,0,0,0,0,7.5,0,1,0, ldraw_lib__4_4edge()],
// 1 16 0 0 2 7.5 0 0 0 0 7.5 0 1 0 4-4edge.dat
  [1,16,0,0,2,7.5,0,0,0,0,7.5,0,1,0, ldraw_lib__4_4edge()],
// 1 16 0 0 2 8 0 0 0 0 8 0 1 0 4-4edge.dat
  [1,16,0,0,2,8,0,0,0,0,8,0,1,0, ldraw_lib__4_4edge()],
// 1 16 0 0 -6 8 0 0 0 0 8 0 1 0 4-4edge.dat
  [1,16,0,0,-6,8,0,0,0,0,8,0,1,0, ldraw_lib__4_4edge()],
// 1 16 0 0 -6 10 0 0 0 0 10 0 1 0 4-4edge.dat
  [1,16,0,0,-6,10,0,0,0,0,10,0,1,0, ldraw_lib__4_4edge()],
// 1 16 0 0 -10 10 0 0 0 0 10 0 1 0 4-4edge.dat
  [1,16,0,0,-10,10,0,0,0,0,10,0,1,0, ldraw_lib__4_4edge()],
// 1 16 0 0 -10 2 0 0 0 0 2 0 1 0 4-4ring4.dat
  [1,16,0,0,-10,2,0,0,0,0,2,0,1,0, ldraw_lib__4_4ring4()],
// 1 16 0 0 -6 2 0 0 0 0 2 0 -1 0 4-4ring4.dat
  [1,16,0,0,-6,2,0,0,0,0,2,0,-1,0, ldraw_lib__4_4ring4()],
// 1 16 0 0 2 0.5 0 0 0 0 0.5 0 -1 0 4-4ring15.dat
  [1,16,0,0,2,0.5,0,0,0,0,0.5,0,-1,0, ldraw_lib__4_4ring15()],
// 1 16 0 0 8 1.5 0 0 0 0 1.5 0 -1 0 4-4ring4.dat
  [1,16,0,0,8,1.5,0,0,0,0,1.5,0,-1,0, ldraw_lib__4_4ring4()],
// 1 16 0 0 -10 1 0 0 0 0 -1 0 1 0 peghole.dat
  [1,16,0,0,-10,1,0,0,0,0,-1,0,1,0, ldraw_lib__peghole()],
// 0 BFC INVERTNEXT
  [0,"BFC","INVERTNEXT"],
// 1 16 0 0 8 6 0 0 0 0 6 0 -16 0 4-4cyli.dat
  [1,16,0,0,8,6,0,0,0,0,6,0,-16,0, ldraw_lib__4_4cyli()],
// 1 16 0 0 8 7.5 0 0 0 0 7.5 0 -6 0 4-4cyli.dat
  [1,16,0,0,8,7.5,0,0,0,0,7.5,0,-6,0, ldraw_lib__4_4cyli()],
// 1 16 0 0 2 8 0 0 0 0 8 0 -8 0 4-4cyli.dat
  [1,16,0,0,2,8,0,0,0,0,8,0,-8,0, ldraw_lib__4_4cyli()],
// 1 16 0 0 -6 10 0 0 0 0 10 0 -4 0 4-4cyli.dat
  [1,16,0,0,-6,10,0,0,0,0,10,0,-4,0, ldraw_lib__4_4cyli()],
// 0
];
module ldraw_lib__6221(step=0, col=false, unit=2/5, alt=false, line=0.2, solid=!$preview)
    makepoly(ldraw_lib__6221(), step=step, col=col, unit=unit, alt=alt, line=line, solid=solid);
ldraw_lib__6221(line=0.2);
